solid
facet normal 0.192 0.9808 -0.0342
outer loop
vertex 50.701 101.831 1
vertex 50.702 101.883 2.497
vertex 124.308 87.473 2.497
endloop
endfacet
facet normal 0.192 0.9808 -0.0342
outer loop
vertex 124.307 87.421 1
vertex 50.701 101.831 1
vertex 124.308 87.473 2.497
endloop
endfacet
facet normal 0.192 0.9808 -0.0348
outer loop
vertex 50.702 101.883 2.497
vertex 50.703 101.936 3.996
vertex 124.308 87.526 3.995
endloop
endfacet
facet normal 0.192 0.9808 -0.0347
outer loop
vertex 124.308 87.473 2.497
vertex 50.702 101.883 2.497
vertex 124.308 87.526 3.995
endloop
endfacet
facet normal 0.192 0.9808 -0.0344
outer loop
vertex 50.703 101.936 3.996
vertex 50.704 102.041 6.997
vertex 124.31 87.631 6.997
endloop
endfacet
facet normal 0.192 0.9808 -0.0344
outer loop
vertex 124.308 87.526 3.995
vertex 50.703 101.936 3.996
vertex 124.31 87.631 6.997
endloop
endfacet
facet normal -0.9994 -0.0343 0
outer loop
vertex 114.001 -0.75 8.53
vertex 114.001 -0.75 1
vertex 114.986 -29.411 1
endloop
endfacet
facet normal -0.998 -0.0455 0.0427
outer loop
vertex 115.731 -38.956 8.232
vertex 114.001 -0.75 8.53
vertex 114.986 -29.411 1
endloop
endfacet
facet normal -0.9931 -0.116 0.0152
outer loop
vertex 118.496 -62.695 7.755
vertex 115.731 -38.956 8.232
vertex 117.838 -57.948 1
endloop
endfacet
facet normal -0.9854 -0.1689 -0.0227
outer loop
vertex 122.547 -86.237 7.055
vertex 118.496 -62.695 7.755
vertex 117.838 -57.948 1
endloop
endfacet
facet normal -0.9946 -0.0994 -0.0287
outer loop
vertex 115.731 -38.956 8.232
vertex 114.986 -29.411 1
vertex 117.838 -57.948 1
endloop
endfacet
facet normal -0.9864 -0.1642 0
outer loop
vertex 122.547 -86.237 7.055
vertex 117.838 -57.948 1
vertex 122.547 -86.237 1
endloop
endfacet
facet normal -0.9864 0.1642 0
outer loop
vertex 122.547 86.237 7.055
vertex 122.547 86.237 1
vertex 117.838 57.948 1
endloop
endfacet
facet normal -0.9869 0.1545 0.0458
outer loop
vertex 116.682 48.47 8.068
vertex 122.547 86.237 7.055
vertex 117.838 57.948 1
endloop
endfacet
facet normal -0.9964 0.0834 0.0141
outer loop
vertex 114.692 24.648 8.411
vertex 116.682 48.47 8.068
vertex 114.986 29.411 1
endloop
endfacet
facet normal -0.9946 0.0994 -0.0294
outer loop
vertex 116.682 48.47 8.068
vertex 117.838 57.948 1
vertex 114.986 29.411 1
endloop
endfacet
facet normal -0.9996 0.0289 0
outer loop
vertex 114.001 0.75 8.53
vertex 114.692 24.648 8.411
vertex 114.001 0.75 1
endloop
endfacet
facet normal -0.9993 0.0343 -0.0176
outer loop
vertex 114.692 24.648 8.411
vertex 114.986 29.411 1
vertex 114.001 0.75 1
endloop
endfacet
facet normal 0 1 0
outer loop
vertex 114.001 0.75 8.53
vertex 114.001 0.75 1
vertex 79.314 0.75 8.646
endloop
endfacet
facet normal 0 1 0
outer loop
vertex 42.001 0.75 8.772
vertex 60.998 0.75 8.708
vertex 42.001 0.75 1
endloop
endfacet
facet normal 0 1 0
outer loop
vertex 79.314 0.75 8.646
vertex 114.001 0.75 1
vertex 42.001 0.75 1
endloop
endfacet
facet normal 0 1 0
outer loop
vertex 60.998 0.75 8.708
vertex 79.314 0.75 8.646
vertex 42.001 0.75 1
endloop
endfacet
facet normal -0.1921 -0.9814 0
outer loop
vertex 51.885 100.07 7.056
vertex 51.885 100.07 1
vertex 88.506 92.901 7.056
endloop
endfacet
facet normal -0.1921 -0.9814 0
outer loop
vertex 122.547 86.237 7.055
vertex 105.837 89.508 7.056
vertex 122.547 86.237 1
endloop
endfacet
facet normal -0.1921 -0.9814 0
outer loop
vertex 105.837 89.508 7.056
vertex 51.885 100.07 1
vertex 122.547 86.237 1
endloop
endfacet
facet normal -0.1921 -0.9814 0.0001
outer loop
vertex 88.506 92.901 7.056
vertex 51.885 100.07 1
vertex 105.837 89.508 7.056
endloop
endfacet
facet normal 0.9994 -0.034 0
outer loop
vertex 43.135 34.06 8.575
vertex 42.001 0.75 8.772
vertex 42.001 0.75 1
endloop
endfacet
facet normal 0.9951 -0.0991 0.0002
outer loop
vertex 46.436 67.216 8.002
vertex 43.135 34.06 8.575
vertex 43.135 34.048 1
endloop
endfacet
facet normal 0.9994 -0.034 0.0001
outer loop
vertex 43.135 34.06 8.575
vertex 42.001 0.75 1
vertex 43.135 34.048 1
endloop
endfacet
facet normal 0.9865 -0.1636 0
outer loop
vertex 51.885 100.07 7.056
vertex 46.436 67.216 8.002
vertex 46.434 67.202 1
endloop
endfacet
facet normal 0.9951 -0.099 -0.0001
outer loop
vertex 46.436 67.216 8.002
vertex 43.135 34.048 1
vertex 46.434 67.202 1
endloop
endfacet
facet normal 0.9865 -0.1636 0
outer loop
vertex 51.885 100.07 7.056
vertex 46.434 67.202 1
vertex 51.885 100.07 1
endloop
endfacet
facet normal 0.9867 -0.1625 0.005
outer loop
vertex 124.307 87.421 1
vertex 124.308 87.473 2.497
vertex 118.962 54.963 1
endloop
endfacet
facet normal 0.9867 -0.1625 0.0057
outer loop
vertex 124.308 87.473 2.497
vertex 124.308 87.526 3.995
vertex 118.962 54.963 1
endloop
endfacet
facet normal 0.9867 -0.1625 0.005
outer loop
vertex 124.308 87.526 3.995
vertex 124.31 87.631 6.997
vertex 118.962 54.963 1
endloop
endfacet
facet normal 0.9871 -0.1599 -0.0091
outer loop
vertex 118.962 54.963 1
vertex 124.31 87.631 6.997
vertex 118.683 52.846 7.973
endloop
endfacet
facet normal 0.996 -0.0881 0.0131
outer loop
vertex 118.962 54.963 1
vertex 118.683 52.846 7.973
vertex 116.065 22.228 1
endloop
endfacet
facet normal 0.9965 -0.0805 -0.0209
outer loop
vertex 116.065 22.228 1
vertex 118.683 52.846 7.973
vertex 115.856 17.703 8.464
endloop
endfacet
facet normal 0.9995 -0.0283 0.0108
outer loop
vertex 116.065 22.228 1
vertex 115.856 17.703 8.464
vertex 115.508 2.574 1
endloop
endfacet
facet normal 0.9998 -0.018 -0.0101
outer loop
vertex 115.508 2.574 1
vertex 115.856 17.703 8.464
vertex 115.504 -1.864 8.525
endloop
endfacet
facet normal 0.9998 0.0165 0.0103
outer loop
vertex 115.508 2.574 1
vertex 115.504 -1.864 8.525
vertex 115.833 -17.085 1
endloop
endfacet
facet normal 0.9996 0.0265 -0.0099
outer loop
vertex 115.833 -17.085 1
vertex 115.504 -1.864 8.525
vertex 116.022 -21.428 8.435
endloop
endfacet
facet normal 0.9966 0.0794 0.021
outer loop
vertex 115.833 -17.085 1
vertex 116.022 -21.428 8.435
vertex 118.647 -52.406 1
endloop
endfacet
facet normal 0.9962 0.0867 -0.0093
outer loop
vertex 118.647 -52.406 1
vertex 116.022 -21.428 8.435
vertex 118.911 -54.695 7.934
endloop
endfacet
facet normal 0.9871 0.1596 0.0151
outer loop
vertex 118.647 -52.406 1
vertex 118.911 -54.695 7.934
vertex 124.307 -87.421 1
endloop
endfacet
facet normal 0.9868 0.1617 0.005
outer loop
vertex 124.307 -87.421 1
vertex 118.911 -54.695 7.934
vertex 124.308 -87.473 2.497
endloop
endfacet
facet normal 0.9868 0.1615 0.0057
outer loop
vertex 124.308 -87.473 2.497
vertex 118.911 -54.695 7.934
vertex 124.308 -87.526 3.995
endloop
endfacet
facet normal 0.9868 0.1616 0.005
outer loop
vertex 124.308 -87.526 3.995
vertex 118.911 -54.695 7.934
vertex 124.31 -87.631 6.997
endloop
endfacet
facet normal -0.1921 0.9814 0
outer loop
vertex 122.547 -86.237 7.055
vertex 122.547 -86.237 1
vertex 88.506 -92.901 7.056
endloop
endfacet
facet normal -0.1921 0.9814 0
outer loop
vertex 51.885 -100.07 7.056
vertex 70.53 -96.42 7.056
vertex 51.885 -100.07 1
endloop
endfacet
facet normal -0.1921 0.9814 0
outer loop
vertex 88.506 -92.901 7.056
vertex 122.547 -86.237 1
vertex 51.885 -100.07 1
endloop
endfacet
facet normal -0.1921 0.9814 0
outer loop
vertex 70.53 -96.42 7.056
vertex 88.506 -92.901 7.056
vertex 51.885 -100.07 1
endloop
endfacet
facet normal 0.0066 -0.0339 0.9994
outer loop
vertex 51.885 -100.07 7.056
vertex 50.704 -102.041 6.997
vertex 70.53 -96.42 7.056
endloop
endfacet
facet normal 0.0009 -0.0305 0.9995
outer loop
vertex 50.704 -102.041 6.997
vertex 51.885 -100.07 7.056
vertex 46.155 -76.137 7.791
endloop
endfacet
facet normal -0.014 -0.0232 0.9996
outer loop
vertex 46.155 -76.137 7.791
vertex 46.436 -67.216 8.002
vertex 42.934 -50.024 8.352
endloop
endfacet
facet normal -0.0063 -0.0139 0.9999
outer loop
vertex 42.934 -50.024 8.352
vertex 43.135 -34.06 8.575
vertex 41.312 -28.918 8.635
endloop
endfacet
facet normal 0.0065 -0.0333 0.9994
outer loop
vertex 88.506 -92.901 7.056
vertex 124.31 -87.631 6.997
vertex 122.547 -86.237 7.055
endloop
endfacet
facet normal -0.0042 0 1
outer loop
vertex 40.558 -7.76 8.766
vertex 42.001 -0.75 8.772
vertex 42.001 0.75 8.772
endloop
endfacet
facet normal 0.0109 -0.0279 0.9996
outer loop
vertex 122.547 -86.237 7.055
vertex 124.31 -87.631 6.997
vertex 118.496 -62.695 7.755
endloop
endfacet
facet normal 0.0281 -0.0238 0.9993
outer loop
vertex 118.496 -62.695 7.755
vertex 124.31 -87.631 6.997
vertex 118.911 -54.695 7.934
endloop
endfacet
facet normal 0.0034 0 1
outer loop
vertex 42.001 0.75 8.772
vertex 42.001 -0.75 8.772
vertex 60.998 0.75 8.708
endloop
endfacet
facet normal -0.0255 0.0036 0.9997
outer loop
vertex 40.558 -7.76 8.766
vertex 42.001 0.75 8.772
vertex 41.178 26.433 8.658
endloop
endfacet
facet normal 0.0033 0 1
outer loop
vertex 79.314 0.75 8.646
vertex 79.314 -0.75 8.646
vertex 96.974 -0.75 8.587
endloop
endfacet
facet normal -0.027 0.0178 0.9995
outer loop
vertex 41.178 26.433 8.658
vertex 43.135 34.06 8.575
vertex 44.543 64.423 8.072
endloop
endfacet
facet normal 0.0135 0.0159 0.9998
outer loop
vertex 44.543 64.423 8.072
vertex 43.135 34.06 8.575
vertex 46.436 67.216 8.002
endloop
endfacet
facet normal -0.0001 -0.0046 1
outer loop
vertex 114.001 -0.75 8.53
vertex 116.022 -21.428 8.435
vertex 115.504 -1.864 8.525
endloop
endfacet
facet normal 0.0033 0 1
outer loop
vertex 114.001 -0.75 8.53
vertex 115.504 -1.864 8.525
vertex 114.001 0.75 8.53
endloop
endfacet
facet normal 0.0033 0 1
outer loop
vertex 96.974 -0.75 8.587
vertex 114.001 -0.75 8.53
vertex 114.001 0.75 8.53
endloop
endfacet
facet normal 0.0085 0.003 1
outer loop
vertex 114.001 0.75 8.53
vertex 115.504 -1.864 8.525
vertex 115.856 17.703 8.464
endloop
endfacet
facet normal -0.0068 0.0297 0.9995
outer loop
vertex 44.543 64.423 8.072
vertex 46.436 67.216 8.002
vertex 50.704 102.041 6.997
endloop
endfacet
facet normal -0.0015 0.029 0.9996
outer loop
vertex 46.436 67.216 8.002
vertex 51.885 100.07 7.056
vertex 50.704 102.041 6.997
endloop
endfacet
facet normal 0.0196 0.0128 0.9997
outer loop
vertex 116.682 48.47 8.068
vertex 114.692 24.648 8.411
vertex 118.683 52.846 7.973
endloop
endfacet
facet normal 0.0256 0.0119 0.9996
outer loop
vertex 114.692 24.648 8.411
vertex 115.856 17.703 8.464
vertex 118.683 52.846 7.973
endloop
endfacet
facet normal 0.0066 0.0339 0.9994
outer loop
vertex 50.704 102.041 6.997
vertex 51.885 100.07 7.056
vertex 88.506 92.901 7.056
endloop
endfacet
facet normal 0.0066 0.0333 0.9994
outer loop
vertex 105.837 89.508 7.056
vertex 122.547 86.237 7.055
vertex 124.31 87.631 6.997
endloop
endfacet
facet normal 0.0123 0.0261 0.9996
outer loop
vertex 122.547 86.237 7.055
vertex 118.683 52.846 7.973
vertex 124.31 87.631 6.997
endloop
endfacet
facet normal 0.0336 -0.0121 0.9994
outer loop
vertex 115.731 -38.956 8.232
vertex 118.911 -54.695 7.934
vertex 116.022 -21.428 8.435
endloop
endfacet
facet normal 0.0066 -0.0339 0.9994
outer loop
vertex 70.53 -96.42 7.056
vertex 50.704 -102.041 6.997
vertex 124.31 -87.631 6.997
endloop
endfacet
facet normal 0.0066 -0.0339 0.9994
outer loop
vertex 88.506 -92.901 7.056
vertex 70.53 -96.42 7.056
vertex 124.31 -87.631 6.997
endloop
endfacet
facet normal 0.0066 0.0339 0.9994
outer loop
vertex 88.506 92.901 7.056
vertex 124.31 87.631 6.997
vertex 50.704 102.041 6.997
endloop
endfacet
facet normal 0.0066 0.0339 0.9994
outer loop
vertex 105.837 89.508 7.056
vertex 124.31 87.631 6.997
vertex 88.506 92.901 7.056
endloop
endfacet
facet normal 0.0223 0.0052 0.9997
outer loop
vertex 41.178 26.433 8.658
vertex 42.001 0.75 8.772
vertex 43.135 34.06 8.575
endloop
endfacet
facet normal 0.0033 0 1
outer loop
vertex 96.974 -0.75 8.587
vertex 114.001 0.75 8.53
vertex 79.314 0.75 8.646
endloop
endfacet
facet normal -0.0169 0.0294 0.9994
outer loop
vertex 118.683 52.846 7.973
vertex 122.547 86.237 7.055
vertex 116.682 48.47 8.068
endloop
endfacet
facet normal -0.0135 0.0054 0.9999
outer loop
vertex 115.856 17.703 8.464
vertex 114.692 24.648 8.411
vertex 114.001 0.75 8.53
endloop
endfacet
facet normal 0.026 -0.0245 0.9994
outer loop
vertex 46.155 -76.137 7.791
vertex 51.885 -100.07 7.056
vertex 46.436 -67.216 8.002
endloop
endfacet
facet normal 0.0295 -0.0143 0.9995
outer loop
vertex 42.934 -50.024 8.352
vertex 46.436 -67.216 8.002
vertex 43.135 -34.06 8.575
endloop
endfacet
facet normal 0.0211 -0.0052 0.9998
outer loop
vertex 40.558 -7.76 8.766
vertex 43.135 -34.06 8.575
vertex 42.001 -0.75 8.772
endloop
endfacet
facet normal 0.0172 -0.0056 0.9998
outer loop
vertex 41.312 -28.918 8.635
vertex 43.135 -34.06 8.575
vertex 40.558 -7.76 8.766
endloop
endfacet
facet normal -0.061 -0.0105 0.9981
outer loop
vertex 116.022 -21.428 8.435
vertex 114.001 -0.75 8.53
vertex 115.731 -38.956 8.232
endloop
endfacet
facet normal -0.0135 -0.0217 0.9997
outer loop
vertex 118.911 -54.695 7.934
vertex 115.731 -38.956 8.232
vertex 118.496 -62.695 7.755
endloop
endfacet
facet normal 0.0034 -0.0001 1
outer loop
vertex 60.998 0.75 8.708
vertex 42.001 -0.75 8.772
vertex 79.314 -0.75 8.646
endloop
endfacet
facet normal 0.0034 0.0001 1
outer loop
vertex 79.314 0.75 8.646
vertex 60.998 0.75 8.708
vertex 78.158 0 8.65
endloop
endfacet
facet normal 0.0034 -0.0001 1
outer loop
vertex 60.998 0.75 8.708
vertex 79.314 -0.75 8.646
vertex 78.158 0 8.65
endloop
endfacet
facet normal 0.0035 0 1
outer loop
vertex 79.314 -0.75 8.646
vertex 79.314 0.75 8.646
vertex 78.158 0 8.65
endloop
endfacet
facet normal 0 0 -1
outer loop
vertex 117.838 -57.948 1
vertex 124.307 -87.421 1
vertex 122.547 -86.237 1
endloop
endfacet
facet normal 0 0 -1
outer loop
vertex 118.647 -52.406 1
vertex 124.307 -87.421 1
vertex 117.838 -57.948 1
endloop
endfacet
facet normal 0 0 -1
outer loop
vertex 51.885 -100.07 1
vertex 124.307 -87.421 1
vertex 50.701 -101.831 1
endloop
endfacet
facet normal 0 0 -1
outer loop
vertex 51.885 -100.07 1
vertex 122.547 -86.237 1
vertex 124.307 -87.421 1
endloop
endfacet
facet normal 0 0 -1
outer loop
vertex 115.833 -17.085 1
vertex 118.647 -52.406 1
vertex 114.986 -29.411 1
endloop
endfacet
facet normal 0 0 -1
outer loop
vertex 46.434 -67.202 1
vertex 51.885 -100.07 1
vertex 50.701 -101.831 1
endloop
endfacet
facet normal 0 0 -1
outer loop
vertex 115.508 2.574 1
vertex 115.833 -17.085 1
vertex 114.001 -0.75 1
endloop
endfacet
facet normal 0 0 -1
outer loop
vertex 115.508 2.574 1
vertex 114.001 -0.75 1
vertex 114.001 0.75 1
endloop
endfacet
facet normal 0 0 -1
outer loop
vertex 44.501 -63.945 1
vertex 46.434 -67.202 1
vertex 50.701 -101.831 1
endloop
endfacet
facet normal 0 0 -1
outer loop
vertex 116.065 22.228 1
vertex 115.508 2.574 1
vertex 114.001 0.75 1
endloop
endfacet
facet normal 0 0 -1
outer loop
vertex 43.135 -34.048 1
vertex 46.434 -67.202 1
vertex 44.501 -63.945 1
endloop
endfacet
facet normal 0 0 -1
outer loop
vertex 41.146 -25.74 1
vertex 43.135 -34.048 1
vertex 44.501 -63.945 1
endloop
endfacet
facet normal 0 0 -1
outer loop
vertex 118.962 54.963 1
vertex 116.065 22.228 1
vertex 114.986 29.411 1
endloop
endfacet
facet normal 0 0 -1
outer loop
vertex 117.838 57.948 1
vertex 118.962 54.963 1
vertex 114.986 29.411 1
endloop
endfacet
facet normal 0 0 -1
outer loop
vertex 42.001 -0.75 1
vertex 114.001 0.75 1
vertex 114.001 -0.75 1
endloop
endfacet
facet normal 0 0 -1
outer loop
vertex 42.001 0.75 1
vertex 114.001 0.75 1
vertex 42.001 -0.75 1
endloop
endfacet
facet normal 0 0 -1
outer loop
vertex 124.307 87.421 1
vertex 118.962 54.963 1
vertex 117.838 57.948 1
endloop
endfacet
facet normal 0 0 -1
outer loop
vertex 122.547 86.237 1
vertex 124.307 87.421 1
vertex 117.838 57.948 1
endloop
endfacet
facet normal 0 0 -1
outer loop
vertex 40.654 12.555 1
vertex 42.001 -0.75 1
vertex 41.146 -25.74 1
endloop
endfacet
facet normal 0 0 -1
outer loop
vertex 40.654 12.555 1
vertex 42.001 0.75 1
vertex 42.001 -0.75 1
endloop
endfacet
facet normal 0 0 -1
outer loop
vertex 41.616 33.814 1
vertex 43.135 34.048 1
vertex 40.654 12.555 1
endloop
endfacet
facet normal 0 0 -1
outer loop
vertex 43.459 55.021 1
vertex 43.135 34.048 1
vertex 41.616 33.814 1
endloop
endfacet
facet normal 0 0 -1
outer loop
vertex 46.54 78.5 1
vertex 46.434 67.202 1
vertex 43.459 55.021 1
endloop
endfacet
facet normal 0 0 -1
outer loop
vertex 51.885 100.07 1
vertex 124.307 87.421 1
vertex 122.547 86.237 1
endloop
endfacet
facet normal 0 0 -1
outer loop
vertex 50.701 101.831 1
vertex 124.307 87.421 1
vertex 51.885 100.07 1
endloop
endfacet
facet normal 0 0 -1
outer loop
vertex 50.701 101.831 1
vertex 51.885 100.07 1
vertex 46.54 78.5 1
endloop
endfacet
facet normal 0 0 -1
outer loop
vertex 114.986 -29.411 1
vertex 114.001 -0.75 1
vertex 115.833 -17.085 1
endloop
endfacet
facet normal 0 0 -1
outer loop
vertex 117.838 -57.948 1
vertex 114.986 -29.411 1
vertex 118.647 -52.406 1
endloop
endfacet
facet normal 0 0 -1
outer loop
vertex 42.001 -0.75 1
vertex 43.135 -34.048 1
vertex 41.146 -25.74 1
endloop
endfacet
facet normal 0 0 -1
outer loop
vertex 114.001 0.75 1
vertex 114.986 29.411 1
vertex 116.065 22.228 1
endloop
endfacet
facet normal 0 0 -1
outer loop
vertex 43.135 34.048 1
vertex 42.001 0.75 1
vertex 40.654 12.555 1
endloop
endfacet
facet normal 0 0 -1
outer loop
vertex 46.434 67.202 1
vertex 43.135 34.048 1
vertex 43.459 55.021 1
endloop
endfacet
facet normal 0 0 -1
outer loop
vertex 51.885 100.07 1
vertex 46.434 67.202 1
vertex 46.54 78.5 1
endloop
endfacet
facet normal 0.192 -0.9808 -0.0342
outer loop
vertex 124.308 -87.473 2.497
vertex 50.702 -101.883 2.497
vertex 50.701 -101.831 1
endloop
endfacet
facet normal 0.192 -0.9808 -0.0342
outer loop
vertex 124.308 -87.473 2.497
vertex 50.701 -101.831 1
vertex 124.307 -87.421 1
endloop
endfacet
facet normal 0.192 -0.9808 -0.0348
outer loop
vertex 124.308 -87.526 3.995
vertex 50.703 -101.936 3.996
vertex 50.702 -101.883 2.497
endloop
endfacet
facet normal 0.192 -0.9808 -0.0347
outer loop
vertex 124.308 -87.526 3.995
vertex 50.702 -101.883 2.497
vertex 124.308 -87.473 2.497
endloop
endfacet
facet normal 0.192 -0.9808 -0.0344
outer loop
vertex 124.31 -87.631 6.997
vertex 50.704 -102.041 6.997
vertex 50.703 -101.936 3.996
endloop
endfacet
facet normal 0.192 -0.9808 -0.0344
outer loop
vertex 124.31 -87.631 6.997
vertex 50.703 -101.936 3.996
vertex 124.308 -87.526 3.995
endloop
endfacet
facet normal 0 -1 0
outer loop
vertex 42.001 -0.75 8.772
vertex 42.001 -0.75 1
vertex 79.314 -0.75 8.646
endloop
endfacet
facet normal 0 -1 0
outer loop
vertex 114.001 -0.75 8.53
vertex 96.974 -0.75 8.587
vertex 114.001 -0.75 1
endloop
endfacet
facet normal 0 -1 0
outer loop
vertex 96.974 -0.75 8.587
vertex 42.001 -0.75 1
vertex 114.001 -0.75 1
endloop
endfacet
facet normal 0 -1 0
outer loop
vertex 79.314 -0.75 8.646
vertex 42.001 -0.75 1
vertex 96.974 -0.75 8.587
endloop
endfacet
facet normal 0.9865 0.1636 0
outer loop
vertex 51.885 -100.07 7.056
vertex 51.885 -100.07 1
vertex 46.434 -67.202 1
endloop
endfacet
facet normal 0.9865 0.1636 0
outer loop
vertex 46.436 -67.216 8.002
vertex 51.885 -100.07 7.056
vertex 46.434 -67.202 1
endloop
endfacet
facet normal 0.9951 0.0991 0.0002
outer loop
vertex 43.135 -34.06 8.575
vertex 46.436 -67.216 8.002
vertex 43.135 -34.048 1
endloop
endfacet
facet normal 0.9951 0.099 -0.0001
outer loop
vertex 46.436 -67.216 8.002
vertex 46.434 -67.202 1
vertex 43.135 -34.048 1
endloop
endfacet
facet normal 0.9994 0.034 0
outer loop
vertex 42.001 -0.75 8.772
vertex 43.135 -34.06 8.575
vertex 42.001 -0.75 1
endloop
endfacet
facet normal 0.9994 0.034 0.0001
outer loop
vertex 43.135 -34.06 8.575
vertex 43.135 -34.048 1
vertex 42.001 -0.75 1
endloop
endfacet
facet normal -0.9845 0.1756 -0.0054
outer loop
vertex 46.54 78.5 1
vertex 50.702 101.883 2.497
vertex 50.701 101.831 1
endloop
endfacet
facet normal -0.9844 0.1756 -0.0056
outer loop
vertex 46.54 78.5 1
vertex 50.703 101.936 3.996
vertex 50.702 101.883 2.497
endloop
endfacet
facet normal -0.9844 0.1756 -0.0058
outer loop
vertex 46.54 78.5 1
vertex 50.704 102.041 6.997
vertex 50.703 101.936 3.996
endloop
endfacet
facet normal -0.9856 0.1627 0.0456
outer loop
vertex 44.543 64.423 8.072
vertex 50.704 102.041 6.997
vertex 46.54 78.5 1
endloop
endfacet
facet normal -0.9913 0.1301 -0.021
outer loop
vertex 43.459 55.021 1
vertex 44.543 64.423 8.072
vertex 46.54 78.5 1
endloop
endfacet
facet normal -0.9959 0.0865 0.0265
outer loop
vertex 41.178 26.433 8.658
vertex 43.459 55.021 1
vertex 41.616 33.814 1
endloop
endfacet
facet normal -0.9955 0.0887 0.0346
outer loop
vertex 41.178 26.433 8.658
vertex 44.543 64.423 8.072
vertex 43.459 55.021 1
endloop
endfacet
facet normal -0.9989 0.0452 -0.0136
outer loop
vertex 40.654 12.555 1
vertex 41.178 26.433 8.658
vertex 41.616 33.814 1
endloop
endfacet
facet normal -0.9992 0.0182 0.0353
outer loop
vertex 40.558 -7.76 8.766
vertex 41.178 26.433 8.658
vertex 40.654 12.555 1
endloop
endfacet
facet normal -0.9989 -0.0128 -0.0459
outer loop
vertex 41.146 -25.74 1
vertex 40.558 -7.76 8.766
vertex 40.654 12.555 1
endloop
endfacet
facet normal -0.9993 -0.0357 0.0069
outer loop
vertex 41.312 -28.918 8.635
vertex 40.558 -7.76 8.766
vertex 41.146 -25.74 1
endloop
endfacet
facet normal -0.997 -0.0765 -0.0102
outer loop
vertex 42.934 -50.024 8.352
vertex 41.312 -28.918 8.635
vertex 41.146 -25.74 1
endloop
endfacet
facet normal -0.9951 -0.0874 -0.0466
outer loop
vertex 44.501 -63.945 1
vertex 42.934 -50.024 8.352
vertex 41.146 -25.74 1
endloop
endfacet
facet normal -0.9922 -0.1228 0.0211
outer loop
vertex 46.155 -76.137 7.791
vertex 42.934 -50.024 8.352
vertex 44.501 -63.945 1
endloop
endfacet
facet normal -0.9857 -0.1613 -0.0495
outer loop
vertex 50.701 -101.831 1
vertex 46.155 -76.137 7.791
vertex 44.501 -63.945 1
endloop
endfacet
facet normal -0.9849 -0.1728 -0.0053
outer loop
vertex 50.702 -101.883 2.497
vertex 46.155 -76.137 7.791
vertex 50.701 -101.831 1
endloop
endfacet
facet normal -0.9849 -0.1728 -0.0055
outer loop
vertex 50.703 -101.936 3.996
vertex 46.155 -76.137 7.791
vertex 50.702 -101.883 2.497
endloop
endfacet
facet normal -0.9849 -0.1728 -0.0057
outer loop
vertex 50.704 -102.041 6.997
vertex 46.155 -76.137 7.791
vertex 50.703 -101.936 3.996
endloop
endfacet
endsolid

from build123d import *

# Parameters (mm, degrees)
F1_ANGLE_BACK = 11.25
F1_ANGLE      = 22.5
F2_W          = 45.7320638196
F2_H          = 22.3794019495
F2_W_2        = 176.9668050066
F2_H_2        = 15.0131394978
F2_W_3        = 53.8554313377
F4_W          = 51.5799054205
F4_H          = 20.0616745278
F5_ANGLE_BACK = 15
F5_ANGLE      = 30
F7_ANGLE_BACK = 15
F7_ANGLE      = 30
F9_DEPTH      = 25


with BuildPart() as f1:
    # F0 (on Front) → F1 (revolve)
    with BuildSketch(Plane.XZ, mode=Mode.PRIVATE) as f1_sk:
        Polygon((0.030159233, 10.9122785955), (0, 1.9123291278), (155.9991241063, 1.3895690886), (156.0292833394, 10.3895185563), align=None)
        Polygon((155.9991241063, 1.3895690886), (0, 1.9123291278), (51.0110905605, -7.2586618498), (155.9689648733, -7.610380379), align=None)
        Polygon((51.0110905605, -7.2586618498), (0, 1.9123291278), (-0.030159233, -7.0876203399), align=None)
    revolve(f1_sk.sketch.rotate(Axis((561.8991869329, 0, -48.7660320647), (-0.176947319, 0, -0.9842203241)), -F1_ANGLE_BACK), axis=Axis((561.8991869329, 0, -48.7660320647), (-0.176947319, 0, -0.9842203241)), revolution_arc=F1_ANGLE)

    # F2 (on Front) → F3 (revolve, cut)
    with BuildSketch(Plane.XZ):
        with Locations((16.1339680902, 18.1897009747)):
            Rectangle(F2_W, F2_H)
        with Locations((82.3720288345, -6.5065697489)):
            Rectangle(F2_W_2, F2_H_2)
        with Locations((143.9277156689, 18.1897009747)):
            Rectangle(F2_W_3, F2_H)
    revolve(axis=Axis((584.9095582962, 0, -6.0216095299), (0, 0, -1)), mode=Mode.SUBTRACT)

    # F4 (on Front) → F5 (revolve, cut)
    with BuildSketch(Plane.XZ, mode=Mode.PRIVATE) as f5_sk:
        Polygon((40.5, 12.6220593229), (-10.8453575522, 12.6220593229), (-10.8453575522, -3.9136288688), (17.7529230866, -3.9136288688), (40.5, -3.9136288688), align=None)
        with Locations((141.2899527103, 6.1172083952)):
            Rectangle(F4_W, F4_H)
    revolve(f5_sk.sketch.rotate(Axis((513.9181956959, 0, -119.0054643705), (0.3118081533, 0, 0.9501450813)), -F5_ANGLE_BACK), axis=Axis((513.9181956959, 0, -119.0054643705), (0.3118081533, 0, 0.9501450813)), revolution_arc=F5_ANGLE, mode=Mode.SUBTRACT)

    # F6 (on Front) → F7 (revolve, cut)
    with BuildSketch(Plane.XZ, mode=Mode.PRIVATE) as f7_sk:
        Polygon((16.4002180099, 17.1660631895), (0.0234571812, 8.9122898249), (156.0225812876, 8.3895297857), (144.173130393, 14.4683616236), align=None)
    revolve(f7_sk.sketch.rotate(Axis((561.8991869329, 0, -48.7660320647), (-0.176947319, 0, -0.9842203241)), -F7_ANGLE_BACK), axis=Axis((561.8991869329, 0, -48.7660320647), (-0.176947319, 0, -0.9842203241)), revolution_arc=F7_ANGLE, mode=Mode.SUBTRACT)

    # F8 (on face) → F9 (cut)
    with BuildSketch(Plane(origin=(0, 0, 1), x_dir=(1, 0, 0), z_dir=(0, 0, -1))):
        with BuildLine():
            Line((122.5469334165, 86.236710341), (51.8850553165, 100.0704402238))
            ThreePointArc((51.8850553165, 100.0704402238), (44.5142638986, 50.6519175795), (42.0005498992, 0.7500119204))
            Line((42.0005498992, 0.7500119204), (114.0006402026, 0.7500119204))
            ThreePointArc((114.0006402026, 0.7500119204), (116.1790999014, 43.7027715868), (122.5469334165, 86.236710341))
        make_face()
        with BuildLine():
            Line((114.0006401619, -0.7499880796), (42.0005498643, -0.7499880796))
            ThreePointArc((42.0005498643, -0.7499880796), (44.5142627181, -50.6519057176), (51.8850553165, -100.0704402238))
            Line((51.8850553165, -100.0704402238), (122.5469334165, -86.236710341))
            ThreePointArc((122.5469334165, -86.236710341), (116.1790987156, -43.7027597256), (114.0006401619, -0.7499880796))
        make_face()
    extrude(amount=-F9_DEPTH, mode=Mode.SUBTRACT)


solid = f1.part
